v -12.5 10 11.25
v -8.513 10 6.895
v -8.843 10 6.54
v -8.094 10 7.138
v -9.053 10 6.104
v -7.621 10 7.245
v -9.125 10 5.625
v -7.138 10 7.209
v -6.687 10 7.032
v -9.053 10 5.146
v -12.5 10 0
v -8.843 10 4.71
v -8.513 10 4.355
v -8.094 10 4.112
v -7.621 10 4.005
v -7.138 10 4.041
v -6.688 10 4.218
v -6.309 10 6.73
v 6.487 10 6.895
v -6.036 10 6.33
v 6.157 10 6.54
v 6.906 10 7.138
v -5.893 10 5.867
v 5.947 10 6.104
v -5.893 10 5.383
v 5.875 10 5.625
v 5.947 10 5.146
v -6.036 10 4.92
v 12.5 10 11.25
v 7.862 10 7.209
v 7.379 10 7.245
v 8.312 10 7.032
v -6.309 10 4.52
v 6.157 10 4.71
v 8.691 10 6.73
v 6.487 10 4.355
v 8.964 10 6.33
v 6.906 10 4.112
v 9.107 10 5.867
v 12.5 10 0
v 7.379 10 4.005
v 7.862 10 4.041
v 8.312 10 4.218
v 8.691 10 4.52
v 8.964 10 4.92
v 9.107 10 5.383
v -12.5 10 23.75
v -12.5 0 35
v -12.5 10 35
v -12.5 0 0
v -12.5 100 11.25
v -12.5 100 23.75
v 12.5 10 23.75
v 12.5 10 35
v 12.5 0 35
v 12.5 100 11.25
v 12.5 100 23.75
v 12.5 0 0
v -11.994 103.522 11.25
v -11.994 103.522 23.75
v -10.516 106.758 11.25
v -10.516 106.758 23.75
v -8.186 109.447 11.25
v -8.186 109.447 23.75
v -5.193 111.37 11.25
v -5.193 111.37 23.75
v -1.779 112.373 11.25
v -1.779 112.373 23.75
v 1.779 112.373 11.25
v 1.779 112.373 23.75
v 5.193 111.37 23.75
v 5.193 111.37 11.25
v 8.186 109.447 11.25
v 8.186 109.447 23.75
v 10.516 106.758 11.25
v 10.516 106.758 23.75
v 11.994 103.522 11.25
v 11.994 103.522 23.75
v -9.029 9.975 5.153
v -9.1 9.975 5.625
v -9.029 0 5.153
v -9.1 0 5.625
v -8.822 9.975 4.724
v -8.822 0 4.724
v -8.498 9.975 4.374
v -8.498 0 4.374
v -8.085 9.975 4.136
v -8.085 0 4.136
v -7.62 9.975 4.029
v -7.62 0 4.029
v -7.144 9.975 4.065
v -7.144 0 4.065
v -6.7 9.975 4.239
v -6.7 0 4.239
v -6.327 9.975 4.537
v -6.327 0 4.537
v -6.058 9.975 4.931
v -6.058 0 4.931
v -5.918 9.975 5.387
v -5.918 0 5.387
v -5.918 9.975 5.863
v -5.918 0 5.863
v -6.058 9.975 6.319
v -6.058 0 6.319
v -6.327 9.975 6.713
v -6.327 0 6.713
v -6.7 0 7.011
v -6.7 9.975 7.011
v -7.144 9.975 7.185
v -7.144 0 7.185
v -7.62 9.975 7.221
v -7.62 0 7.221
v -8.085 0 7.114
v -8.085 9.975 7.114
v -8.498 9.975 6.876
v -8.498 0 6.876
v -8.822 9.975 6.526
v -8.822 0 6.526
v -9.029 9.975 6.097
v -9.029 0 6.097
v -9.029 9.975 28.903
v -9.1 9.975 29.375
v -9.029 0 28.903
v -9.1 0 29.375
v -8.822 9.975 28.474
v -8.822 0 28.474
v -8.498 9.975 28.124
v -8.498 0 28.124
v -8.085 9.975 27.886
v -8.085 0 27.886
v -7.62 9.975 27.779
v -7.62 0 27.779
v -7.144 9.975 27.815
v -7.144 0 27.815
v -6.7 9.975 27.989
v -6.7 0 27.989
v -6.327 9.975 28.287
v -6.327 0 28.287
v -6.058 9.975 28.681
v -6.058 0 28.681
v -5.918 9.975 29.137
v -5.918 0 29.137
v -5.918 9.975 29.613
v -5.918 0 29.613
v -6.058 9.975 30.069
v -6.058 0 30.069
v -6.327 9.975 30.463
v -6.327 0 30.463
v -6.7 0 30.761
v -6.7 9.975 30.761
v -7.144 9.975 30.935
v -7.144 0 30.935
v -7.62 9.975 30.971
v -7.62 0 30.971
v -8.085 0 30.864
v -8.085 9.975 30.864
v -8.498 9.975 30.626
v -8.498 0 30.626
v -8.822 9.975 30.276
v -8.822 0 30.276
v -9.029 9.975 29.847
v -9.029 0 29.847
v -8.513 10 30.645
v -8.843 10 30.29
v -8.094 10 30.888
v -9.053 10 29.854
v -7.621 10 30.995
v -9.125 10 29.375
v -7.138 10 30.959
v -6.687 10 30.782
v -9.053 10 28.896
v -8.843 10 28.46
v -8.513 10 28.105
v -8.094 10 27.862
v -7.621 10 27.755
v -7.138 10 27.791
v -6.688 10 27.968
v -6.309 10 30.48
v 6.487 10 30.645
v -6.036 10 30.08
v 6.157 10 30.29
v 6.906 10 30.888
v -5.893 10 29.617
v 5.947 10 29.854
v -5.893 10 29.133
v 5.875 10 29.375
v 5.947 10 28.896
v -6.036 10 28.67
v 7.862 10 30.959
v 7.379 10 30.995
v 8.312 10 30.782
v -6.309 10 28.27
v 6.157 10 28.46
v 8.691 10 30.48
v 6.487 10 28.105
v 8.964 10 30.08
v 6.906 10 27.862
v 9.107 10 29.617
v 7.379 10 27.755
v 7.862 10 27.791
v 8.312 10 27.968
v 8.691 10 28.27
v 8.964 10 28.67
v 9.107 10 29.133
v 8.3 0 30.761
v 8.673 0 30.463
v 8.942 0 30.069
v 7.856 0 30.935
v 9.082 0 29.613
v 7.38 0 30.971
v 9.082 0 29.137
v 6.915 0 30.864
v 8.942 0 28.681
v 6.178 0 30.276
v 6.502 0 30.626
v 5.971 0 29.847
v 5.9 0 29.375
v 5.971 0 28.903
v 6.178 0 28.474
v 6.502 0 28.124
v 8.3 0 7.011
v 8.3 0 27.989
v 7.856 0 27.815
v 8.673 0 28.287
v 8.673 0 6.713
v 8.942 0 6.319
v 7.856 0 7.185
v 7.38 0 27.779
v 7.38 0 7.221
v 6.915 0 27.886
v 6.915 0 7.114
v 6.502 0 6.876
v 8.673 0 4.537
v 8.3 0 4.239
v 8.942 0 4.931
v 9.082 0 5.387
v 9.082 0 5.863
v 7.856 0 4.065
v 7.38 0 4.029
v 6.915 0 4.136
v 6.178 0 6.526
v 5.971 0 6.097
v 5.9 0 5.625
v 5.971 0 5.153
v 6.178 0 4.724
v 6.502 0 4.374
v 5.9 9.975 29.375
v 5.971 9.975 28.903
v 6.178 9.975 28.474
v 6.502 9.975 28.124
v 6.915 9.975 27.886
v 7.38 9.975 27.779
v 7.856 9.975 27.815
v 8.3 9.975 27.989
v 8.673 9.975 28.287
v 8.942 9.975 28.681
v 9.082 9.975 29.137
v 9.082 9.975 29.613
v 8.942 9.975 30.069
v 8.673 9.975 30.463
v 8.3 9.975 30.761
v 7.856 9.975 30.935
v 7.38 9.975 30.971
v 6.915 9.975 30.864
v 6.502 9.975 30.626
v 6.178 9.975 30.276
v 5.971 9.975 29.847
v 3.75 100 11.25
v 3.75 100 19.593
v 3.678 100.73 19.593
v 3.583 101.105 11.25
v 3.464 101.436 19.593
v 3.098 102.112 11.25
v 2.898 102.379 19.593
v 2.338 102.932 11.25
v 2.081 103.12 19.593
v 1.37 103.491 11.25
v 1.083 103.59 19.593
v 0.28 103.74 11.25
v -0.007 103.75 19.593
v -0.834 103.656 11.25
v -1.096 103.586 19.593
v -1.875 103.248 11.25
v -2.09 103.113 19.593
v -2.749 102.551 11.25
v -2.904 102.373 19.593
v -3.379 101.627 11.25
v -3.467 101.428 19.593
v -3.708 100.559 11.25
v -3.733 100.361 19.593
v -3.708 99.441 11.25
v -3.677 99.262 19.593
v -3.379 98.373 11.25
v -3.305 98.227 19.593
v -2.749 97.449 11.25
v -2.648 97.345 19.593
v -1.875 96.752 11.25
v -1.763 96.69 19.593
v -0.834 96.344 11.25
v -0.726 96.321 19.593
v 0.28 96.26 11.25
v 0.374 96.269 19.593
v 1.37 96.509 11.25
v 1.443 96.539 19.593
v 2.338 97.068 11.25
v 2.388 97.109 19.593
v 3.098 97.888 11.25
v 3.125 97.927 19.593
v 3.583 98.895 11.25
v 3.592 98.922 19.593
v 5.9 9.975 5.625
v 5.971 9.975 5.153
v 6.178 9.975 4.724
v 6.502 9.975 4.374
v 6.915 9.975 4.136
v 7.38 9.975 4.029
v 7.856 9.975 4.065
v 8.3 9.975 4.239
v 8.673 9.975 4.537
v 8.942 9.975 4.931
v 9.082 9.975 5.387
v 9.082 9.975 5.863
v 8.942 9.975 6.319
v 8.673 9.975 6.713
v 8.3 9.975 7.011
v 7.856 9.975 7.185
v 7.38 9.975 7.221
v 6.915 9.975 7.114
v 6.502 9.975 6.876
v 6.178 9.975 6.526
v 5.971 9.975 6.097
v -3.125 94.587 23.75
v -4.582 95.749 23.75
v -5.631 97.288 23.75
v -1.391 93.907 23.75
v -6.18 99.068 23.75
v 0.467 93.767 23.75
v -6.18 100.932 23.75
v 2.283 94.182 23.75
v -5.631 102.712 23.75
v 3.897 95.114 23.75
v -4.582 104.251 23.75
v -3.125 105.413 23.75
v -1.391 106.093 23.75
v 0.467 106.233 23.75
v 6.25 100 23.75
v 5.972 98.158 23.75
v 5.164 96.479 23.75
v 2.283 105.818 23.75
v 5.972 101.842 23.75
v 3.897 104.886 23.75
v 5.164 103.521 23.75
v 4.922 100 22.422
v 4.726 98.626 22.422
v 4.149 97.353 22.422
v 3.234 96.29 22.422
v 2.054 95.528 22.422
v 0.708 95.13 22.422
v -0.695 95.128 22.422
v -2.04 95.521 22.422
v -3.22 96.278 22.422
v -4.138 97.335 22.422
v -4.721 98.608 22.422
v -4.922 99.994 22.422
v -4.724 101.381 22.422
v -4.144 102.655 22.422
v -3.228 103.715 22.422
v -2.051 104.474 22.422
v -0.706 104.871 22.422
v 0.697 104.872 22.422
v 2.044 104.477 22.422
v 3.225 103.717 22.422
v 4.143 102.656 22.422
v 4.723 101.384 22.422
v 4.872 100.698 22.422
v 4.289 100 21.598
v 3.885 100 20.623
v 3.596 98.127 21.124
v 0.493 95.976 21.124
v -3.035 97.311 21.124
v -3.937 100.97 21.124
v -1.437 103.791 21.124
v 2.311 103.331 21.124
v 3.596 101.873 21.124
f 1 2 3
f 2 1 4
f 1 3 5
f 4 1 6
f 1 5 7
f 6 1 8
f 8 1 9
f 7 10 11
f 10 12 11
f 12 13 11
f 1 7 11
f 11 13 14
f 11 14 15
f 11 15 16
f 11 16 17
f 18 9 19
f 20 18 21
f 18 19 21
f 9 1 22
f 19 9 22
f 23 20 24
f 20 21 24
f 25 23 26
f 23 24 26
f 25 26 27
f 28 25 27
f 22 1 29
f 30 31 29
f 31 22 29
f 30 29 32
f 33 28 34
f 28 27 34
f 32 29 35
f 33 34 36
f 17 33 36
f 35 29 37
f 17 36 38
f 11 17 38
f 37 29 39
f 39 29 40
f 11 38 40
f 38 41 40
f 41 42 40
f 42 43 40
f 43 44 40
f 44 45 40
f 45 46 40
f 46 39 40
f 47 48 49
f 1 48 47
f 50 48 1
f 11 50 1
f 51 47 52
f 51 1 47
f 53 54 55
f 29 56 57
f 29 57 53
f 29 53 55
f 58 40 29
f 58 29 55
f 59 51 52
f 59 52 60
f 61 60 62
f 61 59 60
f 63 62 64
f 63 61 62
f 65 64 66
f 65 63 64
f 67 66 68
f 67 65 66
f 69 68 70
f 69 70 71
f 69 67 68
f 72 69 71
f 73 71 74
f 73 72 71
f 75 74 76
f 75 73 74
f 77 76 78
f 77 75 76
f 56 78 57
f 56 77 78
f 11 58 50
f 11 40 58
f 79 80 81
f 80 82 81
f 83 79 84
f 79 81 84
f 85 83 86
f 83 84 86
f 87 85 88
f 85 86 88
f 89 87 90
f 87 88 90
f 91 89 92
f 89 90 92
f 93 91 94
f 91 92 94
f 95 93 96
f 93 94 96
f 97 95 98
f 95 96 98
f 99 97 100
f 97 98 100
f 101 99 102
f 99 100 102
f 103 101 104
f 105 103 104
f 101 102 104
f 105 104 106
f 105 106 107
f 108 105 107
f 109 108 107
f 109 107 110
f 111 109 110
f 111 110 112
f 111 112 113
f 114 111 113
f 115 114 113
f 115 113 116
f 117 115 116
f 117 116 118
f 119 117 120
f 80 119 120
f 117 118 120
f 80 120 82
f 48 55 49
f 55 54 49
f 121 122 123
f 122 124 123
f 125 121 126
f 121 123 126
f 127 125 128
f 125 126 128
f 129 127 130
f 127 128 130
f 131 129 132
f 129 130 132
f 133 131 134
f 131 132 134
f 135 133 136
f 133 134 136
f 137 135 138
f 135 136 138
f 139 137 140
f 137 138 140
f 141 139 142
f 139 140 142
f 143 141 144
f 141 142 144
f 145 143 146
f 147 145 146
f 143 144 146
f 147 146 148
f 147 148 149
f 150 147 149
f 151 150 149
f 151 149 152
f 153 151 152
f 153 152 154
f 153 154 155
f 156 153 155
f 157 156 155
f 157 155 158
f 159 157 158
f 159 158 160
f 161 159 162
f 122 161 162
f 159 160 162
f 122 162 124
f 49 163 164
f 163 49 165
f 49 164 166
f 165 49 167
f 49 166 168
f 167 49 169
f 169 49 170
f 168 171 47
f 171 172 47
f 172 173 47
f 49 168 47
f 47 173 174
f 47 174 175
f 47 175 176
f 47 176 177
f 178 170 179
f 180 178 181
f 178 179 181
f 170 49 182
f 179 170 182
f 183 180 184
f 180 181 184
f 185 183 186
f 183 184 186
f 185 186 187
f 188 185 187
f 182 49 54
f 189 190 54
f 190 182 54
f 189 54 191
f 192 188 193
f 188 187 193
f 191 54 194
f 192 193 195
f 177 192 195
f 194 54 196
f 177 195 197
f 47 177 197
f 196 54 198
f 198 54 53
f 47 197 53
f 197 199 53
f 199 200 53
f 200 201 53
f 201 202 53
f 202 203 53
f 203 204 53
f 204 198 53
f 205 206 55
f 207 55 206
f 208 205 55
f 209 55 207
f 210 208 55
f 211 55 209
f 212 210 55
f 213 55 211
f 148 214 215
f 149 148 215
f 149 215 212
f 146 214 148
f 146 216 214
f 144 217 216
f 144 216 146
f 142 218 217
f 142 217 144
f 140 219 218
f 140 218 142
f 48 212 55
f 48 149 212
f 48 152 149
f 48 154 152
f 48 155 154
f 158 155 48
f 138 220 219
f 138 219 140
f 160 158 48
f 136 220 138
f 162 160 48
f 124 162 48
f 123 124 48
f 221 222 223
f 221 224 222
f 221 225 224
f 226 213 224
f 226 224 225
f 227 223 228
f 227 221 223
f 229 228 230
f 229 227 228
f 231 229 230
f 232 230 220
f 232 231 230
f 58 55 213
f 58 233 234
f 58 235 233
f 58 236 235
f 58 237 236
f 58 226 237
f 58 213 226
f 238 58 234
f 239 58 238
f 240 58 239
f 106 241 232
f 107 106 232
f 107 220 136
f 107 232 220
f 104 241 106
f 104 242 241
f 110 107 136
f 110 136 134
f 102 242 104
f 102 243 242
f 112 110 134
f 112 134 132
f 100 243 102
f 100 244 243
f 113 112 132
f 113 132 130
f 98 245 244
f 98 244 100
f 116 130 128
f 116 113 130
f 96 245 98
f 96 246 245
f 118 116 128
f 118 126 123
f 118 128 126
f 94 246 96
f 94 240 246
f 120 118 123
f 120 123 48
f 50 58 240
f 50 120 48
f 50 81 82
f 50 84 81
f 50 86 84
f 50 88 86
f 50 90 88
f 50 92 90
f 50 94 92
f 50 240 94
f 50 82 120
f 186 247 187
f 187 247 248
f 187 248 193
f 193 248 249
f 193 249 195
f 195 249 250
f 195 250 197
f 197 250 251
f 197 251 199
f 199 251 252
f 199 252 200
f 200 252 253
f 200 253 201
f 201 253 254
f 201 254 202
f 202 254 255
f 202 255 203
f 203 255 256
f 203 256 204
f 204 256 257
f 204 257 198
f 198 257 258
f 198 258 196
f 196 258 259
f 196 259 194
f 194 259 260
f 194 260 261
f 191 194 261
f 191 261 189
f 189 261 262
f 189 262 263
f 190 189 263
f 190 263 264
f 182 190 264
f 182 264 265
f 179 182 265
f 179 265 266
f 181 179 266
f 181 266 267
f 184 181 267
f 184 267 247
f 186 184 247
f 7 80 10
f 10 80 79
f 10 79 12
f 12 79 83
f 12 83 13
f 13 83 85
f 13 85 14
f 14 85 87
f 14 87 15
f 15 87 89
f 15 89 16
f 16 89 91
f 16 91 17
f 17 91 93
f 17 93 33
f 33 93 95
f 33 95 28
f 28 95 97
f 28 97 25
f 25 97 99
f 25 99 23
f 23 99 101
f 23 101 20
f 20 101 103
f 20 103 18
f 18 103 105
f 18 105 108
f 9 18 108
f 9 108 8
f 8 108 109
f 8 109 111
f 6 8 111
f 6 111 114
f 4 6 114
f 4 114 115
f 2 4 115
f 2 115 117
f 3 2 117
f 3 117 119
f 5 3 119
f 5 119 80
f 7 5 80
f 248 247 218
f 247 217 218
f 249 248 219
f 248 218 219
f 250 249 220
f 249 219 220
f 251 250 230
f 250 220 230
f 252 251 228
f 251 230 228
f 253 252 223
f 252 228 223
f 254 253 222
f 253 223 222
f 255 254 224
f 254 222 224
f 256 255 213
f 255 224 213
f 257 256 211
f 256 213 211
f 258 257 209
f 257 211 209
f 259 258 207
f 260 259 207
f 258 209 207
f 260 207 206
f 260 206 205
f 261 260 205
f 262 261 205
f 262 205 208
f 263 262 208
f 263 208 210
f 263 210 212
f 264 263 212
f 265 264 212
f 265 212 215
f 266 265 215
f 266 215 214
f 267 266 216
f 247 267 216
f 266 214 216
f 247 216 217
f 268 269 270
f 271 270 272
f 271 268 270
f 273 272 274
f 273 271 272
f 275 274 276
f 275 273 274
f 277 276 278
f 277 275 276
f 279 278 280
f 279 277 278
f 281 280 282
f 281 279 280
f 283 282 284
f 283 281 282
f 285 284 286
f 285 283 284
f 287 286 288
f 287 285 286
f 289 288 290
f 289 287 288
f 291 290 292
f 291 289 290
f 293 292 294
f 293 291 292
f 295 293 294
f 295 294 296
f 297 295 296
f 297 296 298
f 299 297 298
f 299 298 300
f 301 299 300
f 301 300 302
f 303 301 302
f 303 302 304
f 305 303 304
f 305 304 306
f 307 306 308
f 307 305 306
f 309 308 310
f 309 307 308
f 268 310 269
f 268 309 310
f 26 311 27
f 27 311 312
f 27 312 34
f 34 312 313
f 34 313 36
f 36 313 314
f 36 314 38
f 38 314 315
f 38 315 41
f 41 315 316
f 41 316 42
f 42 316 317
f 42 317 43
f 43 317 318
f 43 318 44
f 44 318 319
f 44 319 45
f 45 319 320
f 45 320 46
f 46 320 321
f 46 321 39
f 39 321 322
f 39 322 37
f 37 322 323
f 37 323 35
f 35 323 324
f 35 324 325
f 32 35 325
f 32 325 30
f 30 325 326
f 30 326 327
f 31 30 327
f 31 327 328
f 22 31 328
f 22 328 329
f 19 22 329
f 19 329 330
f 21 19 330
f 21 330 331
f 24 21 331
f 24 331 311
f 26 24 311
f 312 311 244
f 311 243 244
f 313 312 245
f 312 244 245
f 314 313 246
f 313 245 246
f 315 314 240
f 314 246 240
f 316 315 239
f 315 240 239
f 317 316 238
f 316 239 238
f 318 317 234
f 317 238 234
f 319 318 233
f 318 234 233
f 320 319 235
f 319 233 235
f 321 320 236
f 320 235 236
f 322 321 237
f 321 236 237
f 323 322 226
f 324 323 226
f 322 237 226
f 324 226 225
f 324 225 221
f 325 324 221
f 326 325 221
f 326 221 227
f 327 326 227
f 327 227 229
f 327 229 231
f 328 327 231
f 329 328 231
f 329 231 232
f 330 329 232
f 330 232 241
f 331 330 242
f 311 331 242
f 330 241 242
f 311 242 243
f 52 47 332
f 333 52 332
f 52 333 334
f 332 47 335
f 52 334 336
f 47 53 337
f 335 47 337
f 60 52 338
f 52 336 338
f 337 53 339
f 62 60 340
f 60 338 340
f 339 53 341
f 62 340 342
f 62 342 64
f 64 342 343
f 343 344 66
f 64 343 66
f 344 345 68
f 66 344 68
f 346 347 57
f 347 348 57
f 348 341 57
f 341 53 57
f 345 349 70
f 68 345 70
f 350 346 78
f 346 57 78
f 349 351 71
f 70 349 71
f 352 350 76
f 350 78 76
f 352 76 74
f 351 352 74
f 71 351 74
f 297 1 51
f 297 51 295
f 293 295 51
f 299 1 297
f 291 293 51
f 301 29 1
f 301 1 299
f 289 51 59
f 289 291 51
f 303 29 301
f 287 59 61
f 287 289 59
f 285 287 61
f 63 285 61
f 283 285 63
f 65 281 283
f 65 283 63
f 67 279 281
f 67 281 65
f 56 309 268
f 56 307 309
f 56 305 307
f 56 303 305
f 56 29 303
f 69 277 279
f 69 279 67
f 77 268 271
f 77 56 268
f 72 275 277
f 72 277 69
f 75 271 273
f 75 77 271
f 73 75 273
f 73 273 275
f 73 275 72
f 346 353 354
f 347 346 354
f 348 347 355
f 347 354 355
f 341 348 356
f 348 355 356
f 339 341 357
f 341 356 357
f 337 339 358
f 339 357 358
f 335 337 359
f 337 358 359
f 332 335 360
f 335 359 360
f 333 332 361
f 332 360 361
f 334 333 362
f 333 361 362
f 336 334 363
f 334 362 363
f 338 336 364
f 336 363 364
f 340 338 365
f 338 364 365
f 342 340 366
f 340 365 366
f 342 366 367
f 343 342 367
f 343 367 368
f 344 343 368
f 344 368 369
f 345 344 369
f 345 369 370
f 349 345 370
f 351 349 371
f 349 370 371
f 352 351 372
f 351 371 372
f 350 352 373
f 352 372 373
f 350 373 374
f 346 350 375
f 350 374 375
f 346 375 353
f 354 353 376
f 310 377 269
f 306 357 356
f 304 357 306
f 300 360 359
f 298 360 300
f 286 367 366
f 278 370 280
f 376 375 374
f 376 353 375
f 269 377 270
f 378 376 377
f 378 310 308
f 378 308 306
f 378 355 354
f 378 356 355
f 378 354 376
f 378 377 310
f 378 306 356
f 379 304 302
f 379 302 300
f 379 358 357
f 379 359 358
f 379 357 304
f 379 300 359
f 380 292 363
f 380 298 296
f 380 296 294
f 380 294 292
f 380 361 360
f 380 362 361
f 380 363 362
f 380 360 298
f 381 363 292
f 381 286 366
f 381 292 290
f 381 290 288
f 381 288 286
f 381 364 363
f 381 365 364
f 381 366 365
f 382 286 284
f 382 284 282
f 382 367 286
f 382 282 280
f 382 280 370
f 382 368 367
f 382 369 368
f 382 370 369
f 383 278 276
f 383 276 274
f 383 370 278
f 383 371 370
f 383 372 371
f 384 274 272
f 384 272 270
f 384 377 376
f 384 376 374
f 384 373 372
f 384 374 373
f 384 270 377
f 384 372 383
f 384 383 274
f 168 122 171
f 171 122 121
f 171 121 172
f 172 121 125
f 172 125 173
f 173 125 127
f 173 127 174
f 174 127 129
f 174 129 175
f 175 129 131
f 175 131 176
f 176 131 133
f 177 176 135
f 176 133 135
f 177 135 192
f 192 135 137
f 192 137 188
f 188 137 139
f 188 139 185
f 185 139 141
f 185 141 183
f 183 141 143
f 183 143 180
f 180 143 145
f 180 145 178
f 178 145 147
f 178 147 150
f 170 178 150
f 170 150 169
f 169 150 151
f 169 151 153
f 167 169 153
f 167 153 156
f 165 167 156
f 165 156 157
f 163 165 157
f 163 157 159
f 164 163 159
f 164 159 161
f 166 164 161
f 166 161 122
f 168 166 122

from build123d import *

# Parameters (mm, degrees)
SKETCH1_R                            = 3.75
BOSS_EXTRUDE1_DEPTH                  = 35
SKETCH5_W                            = 11.25
SKETCH5_H                            = 102.5
CUT_EXTRUDE1_DEPTH                   = 121.441894704
F_3_2_3_2_DIAMETER_HOLE1_D           = 3.2
F_3_2_3_2_DIAMETER_HOLE1_CSINK_D     = 3.25
F_3_2_3_2_DIAMETER_HOLE1_CSINK_ANGLE = 90
CHAMFER1_SIZE                        = 2.5
FILLET1_R                            = 4


with BuildPart() as part:
    # Sketch1 → Boss-Extrude1 (new body)
    with BuildSketch(Plane.XY):
        with BuildLine():
            Line((0, 0), (-12.5, 0))
            Line((-12.5, 0), (-12.5, 100))
            ThreePointArc((-12.5, 100), (0, 112.5), (12.5, 100))
            Line((12.5, 100), (12.5, 0))
            Line((12.5, 0), (0, 0))
        make_face()
        with Locations((0, 100)):
            Circle(SKETCH1_R, mode=Mode.SUBTRACT)
    extrude(amount=BOSS_EXTRUDE1_DEPTH)

    # Sketch5 → Cut-Extrude1 (cut, through all)
    with BuildSketch(Plane(origin=(12.5, 0, 0), x_dir=(0, 0, -1), z_dir=(1, 0, 0))):
        with Locations((-29.375, 61.25)):
            Rectangle(SKETCH5_W, SKETCH5_H)
        with Locations((-5.625, 61.25)):
            Rectangle(SKETCH5_W, SKETCH5_H)
    extrude(amount=-CUT_EXTRUDE1_DEPTH, mode=Mode.SUBTRACT)

    # Ø3.2 (3.2) Diameter Hole1 (through all)
    with Locations(Plane(origin=(0, 10, 0), x_dir=(1, 0, 0), z_dir=(0, 1, 0))):
        with Locations((-7.5, -5.625), (7.5, -5.625), (7.5, -29.375), (-7.5, -29.375)):
            CounterSinkHole(F_3_2_3_2_DIAMETER_HOLE1_D / 2, F_3_2_3_2_DIAMETER_HOLE1_CSINK_D / 2, counter_sink_angle=F_3_2_3_2_DIAMETER_HOLE1_CSINK_ANGLE)

    # Chamfer1
    chamfer1_edges = [part.edges().sort_by_distance(p)[0] for p in [
        (-3.75, 100, 23.75),
    ]]
    chamfer(chamfer1_edges, length=CHAMFER1_SIZE)

    # Fillet1
    fillet1_edges = [part.edges().sort_by_distance(p)[0] for p in [
        (-3.75, 100, 21.25),
    ]]
    fillet(fillet1_edges, radius=FILLET1_R)


solid = part.part
